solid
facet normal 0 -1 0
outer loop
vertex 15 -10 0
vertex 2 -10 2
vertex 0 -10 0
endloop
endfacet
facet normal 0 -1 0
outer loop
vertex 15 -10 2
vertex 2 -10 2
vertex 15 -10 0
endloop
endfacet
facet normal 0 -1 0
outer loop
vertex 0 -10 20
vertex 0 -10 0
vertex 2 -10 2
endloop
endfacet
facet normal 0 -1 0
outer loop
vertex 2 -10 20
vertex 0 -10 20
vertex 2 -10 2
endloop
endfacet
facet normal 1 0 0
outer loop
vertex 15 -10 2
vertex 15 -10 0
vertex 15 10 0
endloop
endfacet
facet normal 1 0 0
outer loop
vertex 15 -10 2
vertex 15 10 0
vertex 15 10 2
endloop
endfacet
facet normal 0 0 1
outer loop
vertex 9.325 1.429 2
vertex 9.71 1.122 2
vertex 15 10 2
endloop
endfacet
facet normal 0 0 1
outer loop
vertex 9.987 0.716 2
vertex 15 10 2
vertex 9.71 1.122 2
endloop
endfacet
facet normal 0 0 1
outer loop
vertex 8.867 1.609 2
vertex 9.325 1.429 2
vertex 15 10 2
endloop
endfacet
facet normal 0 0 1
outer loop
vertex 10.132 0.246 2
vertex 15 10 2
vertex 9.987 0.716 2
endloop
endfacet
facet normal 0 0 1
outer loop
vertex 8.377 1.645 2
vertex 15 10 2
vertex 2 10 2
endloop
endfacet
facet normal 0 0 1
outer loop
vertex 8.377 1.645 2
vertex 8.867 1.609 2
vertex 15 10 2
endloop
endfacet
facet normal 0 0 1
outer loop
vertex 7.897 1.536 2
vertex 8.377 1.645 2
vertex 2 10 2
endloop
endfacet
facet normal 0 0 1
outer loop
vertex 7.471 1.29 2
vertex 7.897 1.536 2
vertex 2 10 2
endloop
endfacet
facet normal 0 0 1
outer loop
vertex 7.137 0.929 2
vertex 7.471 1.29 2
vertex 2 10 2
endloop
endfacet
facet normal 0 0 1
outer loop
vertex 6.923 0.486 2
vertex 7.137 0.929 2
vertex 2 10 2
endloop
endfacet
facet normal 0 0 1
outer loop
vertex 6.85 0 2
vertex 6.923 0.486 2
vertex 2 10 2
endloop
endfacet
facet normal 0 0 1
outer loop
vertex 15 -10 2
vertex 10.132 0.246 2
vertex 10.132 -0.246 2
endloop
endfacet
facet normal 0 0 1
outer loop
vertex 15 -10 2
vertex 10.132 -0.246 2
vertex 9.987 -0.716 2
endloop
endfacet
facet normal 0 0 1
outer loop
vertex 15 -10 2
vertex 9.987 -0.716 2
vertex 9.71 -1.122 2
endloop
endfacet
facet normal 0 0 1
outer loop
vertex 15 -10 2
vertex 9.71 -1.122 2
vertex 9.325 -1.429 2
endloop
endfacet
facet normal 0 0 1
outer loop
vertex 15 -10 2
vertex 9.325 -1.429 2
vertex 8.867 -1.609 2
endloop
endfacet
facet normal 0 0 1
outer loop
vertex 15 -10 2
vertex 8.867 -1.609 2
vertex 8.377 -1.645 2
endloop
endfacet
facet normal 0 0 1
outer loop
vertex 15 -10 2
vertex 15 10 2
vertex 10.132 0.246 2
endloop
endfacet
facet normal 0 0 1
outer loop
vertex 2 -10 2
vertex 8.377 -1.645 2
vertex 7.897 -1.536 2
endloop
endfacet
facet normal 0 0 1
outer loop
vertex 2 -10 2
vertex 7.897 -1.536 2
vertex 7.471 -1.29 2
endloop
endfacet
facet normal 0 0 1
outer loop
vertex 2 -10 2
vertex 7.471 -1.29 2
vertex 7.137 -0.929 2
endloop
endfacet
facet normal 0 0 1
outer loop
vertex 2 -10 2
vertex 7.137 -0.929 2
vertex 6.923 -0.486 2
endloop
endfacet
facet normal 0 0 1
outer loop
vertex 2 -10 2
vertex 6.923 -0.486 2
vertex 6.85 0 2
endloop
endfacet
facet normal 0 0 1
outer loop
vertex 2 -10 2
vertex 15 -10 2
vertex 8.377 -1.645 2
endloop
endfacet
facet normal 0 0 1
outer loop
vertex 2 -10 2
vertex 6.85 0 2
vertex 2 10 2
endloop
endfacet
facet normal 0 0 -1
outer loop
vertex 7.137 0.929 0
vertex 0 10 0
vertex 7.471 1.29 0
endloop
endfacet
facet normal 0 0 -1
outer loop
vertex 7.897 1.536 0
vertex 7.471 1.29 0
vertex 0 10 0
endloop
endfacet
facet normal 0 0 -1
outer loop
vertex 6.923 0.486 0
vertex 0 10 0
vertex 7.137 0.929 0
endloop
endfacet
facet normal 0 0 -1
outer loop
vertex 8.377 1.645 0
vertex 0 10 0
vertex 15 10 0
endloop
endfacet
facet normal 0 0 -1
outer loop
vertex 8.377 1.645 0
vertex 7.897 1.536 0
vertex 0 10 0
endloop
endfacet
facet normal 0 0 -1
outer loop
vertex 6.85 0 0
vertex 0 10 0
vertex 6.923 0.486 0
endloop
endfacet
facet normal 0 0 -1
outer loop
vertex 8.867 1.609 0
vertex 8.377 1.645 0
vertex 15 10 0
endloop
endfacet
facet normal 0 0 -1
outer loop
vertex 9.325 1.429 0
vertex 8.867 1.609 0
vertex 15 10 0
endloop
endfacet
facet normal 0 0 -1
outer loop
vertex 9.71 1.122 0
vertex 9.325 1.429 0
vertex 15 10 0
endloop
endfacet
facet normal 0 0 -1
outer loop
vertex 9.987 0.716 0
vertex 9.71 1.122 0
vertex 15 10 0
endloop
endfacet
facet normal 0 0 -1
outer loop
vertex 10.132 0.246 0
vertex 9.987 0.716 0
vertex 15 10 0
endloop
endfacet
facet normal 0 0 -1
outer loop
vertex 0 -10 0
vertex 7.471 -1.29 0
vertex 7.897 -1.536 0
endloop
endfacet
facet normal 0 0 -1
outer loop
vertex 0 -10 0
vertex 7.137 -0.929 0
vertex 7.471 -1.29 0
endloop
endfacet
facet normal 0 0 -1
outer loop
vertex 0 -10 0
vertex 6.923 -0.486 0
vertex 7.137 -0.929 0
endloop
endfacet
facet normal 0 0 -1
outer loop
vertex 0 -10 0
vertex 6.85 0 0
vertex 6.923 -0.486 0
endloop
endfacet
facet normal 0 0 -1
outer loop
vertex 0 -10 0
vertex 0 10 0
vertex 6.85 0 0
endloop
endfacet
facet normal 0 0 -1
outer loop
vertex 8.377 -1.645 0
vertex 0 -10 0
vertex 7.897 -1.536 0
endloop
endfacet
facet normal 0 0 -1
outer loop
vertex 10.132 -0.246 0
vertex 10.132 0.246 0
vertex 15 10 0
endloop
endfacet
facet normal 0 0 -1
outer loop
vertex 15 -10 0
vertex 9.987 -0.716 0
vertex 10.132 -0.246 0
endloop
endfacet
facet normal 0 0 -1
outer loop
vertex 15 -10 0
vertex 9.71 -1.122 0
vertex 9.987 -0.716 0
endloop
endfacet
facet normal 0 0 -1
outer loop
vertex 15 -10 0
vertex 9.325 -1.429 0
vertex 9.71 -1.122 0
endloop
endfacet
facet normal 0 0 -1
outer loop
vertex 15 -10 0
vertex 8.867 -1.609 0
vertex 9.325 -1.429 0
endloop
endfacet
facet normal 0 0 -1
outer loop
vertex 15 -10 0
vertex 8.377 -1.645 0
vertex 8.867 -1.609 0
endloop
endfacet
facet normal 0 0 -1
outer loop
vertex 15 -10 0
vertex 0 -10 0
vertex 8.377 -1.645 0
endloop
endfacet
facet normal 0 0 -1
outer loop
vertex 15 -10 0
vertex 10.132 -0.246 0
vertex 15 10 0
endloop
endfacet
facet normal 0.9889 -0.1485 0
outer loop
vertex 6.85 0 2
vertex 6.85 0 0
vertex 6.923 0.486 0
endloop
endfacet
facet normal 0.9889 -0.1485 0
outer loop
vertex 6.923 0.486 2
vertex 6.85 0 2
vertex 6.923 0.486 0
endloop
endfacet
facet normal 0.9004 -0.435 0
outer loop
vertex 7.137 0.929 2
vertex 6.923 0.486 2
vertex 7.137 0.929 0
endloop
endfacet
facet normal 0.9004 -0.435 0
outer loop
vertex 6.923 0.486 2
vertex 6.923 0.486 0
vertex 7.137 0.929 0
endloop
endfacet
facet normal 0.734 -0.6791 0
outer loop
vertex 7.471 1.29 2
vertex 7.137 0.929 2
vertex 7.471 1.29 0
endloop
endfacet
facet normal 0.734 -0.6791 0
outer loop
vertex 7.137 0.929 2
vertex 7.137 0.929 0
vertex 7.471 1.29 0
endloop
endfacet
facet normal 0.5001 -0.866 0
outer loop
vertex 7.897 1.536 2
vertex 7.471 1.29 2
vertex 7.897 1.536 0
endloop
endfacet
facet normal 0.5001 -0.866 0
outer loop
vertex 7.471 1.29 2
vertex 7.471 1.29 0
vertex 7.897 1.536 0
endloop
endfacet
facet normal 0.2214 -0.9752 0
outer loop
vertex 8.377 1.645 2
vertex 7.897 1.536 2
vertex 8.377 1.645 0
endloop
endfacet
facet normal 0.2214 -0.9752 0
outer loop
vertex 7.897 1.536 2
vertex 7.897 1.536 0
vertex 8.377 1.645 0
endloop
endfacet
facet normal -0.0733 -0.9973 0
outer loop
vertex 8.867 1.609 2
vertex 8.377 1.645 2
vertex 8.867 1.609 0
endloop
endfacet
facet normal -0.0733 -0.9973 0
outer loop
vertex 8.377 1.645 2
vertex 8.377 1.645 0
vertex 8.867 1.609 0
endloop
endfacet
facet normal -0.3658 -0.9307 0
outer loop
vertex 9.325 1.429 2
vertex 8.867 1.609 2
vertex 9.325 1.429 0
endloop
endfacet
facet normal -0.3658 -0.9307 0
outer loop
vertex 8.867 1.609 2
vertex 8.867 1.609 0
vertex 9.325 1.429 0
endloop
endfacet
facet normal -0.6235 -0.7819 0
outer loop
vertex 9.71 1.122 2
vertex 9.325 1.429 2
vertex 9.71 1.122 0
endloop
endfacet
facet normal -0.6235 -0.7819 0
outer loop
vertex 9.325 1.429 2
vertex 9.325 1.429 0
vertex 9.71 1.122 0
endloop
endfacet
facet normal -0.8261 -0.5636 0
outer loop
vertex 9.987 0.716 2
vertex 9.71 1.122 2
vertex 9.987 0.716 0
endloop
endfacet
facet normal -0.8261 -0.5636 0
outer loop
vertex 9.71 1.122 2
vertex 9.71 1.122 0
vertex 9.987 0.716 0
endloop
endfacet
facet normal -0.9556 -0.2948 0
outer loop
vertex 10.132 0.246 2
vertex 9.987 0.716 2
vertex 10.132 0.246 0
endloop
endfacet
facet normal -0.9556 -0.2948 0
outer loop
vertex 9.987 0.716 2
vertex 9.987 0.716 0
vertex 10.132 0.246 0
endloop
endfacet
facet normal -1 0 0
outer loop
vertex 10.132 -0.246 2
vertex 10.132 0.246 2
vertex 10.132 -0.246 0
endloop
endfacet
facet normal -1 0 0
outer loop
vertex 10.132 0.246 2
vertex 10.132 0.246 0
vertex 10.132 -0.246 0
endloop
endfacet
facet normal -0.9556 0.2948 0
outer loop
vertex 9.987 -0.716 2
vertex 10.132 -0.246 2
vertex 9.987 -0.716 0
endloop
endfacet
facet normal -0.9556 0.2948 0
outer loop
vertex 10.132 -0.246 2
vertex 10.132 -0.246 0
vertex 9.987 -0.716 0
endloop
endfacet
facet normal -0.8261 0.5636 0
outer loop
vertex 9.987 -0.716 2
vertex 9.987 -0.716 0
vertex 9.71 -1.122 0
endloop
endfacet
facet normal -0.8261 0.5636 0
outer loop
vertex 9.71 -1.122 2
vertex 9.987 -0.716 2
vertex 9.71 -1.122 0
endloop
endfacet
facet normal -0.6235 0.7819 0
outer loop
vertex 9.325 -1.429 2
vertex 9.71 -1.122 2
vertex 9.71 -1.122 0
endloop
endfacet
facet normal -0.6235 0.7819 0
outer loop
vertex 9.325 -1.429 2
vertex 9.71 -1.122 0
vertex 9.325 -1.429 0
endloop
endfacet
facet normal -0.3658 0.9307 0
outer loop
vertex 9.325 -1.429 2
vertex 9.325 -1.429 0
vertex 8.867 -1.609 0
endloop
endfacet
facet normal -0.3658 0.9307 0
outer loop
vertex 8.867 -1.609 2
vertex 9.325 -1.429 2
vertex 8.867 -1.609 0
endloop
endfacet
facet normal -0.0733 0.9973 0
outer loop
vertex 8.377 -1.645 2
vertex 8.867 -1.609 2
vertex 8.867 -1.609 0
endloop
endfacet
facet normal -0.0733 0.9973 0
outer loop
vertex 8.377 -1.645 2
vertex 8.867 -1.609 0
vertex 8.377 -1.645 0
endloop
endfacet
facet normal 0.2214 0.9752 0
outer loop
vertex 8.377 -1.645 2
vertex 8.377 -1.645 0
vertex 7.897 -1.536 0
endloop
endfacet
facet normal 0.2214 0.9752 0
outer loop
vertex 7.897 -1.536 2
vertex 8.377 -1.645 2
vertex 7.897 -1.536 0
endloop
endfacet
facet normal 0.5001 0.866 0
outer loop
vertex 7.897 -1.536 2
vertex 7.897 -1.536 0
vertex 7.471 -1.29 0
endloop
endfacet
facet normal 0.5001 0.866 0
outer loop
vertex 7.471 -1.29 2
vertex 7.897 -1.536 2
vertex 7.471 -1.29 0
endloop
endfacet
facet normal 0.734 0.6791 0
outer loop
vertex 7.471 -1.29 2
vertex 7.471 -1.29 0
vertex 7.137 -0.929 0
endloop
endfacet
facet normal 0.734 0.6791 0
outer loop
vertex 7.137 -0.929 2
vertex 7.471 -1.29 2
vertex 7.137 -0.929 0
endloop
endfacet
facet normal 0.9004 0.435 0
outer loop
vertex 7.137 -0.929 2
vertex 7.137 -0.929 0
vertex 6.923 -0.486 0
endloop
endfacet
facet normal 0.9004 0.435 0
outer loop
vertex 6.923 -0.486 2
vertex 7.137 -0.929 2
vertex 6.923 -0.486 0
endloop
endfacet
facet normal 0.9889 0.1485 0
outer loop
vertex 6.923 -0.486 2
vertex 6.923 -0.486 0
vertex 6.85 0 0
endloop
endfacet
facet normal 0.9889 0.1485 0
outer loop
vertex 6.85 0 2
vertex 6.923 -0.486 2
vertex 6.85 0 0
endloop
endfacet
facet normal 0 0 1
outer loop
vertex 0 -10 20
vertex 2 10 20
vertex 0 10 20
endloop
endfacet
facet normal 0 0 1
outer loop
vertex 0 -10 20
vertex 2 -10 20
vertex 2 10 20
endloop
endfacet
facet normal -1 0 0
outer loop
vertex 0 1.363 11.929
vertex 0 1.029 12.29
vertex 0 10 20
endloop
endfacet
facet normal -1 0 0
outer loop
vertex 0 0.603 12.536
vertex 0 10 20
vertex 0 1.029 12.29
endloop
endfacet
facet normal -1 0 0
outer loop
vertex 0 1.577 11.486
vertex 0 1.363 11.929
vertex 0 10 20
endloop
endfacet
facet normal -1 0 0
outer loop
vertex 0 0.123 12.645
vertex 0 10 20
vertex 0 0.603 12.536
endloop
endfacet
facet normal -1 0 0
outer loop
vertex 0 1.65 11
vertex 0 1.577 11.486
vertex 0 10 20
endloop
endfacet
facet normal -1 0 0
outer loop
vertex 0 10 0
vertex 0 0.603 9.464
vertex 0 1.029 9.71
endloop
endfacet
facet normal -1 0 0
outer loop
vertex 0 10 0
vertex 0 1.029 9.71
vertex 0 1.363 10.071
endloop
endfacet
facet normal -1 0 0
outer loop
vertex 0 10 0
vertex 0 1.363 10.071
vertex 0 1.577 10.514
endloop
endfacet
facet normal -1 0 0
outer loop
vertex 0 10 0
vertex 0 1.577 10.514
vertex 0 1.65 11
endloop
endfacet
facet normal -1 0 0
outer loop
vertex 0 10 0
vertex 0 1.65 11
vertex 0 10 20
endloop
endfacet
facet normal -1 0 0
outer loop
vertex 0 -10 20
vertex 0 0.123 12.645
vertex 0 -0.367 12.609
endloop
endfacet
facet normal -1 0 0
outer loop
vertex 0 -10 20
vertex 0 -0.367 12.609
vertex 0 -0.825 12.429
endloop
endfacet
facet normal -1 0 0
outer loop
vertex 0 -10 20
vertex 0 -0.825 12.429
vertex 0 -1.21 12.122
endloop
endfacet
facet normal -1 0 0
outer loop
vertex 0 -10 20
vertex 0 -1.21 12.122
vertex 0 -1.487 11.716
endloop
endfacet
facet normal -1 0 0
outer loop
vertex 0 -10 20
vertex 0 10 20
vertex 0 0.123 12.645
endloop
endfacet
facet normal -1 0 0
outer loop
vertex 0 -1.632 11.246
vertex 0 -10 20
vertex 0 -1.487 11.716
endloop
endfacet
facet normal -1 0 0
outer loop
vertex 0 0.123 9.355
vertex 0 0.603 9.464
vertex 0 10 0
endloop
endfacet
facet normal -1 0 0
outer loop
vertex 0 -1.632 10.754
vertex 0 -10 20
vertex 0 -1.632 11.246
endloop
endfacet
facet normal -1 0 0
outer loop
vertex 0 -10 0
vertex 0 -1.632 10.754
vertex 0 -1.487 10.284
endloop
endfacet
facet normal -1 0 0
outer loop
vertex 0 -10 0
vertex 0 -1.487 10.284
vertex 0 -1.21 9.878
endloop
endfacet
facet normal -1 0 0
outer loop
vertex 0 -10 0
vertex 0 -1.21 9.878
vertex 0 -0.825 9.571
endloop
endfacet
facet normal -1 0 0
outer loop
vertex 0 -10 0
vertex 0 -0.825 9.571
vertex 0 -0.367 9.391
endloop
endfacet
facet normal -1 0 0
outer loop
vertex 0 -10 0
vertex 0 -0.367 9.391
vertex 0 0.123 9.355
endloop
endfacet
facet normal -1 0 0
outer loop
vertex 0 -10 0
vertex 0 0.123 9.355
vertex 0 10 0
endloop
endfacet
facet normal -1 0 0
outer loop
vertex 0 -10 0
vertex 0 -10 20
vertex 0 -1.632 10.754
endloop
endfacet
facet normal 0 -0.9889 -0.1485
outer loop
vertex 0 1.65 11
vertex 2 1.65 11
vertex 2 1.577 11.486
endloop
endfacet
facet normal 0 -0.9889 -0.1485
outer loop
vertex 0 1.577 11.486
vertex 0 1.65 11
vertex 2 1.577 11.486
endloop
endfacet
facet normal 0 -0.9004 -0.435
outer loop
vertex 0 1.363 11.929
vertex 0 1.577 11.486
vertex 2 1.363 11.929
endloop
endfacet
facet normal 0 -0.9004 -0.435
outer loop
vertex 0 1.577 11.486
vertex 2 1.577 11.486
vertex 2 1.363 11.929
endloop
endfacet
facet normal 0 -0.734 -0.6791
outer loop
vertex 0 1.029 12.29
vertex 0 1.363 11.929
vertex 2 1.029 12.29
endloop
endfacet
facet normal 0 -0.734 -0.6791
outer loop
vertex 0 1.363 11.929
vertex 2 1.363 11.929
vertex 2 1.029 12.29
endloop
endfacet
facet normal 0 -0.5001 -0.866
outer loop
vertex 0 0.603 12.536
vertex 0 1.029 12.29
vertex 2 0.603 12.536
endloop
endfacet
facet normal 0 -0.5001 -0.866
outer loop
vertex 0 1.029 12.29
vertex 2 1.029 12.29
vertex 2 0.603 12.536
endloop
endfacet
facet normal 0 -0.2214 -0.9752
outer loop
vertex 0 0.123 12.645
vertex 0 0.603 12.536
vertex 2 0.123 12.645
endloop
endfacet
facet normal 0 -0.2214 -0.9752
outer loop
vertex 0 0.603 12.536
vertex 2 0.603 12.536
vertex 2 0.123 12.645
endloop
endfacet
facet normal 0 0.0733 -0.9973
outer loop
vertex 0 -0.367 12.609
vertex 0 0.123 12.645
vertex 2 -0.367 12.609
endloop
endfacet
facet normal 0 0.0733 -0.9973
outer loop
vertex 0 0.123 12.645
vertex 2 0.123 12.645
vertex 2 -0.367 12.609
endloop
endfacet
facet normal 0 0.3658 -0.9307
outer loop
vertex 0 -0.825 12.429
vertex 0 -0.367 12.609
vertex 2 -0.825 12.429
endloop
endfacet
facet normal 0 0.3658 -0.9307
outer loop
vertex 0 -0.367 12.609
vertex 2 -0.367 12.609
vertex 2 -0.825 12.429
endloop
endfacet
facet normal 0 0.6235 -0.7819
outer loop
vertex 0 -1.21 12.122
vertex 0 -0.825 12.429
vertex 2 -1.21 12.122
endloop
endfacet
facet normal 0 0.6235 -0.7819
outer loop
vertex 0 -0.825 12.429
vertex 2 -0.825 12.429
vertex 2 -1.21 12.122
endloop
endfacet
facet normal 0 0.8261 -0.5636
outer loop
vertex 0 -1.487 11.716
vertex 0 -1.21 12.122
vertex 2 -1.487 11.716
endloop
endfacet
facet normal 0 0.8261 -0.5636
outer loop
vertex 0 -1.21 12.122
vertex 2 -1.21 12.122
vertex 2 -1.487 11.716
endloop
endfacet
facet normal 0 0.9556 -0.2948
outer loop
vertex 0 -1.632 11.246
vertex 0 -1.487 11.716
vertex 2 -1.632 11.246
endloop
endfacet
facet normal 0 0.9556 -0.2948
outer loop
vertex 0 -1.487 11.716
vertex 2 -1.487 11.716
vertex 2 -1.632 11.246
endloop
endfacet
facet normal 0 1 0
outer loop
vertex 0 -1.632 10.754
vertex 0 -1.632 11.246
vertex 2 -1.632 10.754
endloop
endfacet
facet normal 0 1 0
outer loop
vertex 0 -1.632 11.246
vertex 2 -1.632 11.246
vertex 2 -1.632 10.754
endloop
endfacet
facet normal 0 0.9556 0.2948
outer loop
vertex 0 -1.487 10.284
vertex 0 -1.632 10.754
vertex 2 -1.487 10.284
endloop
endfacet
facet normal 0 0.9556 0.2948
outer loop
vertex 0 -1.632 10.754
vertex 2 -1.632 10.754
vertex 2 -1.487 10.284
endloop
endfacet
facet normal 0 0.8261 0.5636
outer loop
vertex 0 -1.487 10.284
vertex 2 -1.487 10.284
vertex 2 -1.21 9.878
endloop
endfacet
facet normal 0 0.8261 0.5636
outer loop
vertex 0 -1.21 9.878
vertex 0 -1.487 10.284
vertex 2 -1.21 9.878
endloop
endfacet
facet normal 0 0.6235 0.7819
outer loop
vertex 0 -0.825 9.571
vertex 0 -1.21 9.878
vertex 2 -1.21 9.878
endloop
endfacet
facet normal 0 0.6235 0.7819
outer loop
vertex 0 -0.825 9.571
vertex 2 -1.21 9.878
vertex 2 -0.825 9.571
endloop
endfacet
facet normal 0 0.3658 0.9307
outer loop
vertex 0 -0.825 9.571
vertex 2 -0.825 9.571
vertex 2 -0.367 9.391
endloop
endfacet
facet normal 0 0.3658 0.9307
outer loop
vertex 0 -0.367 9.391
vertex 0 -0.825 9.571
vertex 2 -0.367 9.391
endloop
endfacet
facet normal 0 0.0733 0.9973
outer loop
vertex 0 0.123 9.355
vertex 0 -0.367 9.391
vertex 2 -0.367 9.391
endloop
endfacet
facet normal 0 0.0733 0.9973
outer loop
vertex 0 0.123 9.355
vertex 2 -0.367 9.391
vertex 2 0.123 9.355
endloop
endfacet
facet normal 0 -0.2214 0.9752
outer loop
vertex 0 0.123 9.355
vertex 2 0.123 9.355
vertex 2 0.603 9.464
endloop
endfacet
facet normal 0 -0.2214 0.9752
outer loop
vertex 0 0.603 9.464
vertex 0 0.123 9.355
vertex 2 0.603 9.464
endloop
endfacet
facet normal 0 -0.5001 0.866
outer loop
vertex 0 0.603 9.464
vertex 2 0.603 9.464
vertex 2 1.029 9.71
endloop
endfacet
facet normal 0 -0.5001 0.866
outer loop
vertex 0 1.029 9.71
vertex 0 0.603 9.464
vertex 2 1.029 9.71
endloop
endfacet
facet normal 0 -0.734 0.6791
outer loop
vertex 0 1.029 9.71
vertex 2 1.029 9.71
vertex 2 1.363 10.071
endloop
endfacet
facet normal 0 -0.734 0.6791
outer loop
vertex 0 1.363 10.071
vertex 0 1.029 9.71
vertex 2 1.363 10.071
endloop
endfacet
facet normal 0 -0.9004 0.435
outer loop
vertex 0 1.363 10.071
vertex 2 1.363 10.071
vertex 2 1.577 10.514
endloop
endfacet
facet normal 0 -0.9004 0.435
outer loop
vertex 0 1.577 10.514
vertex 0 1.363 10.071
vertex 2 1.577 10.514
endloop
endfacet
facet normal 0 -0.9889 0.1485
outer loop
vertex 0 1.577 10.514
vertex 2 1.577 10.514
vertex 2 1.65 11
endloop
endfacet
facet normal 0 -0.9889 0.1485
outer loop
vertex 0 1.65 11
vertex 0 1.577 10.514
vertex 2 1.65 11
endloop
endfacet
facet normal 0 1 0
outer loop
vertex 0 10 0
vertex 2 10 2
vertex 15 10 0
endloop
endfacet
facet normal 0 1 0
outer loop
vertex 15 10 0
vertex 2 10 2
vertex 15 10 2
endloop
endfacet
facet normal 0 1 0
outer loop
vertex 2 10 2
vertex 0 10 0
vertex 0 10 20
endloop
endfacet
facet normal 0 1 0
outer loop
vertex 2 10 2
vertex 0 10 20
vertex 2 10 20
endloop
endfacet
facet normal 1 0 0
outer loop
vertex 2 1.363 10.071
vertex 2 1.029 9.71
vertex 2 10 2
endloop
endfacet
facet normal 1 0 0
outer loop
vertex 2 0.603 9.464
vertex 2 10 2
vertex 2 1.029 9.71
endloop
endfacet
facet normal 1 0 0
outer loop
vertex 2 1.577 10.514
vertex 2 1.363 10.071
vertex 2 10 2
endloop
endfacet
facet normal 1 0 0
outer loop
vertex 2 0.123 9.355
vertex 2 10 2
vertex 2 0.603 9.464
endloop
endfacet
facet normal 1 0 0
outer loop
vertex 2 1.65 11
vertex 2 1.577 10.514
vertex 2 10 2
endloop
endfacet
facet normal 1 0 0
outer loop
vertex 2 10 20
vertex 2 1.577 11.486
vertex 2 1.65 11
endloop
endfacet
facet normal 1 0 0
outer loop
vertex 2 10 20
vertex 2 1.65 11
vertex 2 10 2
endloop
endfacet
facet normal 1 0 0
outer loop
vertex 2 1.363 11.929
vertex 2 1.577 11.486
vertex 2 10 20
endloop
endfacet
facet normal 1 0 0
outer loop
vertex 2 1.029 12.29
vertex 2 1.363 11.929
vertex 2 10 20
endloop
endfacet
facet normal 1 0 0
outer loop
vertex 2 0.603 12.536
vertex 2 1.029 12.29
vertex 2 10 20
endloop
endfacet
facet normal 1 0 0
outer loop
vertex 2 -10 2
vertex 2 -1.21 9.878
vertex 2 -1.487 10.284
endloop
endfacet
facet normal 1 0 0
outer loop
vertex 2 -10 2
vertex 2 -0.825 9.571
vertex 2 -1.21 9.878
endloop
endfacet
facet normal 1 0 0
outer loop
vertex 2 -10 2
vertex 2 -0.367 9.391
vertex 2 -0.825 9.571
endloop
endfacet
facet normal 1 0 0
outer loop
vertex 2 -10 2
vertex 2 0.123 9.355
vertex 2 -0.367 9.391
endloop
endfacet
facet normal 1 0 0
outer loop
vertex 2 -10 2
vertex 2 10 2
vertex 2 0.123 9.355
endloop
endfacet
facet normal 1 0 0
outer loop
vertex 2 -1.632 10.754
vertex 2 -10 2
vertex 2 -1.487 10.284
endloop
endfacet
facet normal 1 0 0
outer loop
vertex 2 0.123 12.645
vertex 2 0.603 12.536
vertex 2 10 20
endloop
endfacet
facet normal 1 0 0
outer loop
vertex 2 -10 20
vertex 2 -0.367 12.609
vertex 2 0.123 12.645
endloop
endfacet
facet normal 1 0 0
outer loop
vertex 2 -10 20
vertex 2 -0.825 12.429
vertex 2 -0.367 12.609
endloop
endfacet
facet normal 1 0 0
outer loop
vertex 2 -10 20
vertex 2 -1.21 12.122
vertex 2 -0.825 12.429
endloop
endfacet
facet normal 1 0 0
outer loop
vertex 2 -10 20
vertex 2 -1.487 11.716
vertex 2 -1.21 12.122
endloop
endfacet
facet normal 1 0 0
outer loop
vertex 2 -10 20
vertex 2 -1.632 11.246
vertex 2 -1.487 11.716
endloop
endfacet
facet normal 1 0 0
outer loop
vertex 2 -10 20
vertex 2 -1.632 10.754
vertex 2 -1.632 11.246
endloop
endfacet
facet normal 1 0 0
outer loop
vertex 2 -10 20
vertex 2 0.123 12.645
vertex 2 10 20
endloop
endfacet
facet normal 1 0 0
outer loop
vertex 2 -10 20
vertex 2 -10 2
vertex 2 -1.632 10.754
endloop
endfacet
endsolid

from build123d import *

# Parameters (mm, degrees)
F1_DEPTH   = 10
F4_D       = 3.3
F4_ON_F3_D = 3.3


with BuildPart() as f1:
    # F0 (on Front) → F1 (new body, symmetric)
    with BuildSketch(Plane.XZ):
        Polygon((0, 20), (0, 0), (15, 0), (15, 2), (2, 2), (2, 20), align=None)
    extrude(amount=F1_DEPTH, both=True)

    # F4 (through all)
    with Locations(Plane(origin=(0, 0, 0), x_dir=(0, -1, 0), z_dir=(-1, 0, 0))):
        with Locations((0, 11)):
            Hole(F4_D / 2)

    # F4 on F3 (through all)
    with Locations(Plane.XY.offset(2)):
        with Locations((8.5, 0)):
            Hole(F4_ON_F3_D / 2)


solid = f1.part
